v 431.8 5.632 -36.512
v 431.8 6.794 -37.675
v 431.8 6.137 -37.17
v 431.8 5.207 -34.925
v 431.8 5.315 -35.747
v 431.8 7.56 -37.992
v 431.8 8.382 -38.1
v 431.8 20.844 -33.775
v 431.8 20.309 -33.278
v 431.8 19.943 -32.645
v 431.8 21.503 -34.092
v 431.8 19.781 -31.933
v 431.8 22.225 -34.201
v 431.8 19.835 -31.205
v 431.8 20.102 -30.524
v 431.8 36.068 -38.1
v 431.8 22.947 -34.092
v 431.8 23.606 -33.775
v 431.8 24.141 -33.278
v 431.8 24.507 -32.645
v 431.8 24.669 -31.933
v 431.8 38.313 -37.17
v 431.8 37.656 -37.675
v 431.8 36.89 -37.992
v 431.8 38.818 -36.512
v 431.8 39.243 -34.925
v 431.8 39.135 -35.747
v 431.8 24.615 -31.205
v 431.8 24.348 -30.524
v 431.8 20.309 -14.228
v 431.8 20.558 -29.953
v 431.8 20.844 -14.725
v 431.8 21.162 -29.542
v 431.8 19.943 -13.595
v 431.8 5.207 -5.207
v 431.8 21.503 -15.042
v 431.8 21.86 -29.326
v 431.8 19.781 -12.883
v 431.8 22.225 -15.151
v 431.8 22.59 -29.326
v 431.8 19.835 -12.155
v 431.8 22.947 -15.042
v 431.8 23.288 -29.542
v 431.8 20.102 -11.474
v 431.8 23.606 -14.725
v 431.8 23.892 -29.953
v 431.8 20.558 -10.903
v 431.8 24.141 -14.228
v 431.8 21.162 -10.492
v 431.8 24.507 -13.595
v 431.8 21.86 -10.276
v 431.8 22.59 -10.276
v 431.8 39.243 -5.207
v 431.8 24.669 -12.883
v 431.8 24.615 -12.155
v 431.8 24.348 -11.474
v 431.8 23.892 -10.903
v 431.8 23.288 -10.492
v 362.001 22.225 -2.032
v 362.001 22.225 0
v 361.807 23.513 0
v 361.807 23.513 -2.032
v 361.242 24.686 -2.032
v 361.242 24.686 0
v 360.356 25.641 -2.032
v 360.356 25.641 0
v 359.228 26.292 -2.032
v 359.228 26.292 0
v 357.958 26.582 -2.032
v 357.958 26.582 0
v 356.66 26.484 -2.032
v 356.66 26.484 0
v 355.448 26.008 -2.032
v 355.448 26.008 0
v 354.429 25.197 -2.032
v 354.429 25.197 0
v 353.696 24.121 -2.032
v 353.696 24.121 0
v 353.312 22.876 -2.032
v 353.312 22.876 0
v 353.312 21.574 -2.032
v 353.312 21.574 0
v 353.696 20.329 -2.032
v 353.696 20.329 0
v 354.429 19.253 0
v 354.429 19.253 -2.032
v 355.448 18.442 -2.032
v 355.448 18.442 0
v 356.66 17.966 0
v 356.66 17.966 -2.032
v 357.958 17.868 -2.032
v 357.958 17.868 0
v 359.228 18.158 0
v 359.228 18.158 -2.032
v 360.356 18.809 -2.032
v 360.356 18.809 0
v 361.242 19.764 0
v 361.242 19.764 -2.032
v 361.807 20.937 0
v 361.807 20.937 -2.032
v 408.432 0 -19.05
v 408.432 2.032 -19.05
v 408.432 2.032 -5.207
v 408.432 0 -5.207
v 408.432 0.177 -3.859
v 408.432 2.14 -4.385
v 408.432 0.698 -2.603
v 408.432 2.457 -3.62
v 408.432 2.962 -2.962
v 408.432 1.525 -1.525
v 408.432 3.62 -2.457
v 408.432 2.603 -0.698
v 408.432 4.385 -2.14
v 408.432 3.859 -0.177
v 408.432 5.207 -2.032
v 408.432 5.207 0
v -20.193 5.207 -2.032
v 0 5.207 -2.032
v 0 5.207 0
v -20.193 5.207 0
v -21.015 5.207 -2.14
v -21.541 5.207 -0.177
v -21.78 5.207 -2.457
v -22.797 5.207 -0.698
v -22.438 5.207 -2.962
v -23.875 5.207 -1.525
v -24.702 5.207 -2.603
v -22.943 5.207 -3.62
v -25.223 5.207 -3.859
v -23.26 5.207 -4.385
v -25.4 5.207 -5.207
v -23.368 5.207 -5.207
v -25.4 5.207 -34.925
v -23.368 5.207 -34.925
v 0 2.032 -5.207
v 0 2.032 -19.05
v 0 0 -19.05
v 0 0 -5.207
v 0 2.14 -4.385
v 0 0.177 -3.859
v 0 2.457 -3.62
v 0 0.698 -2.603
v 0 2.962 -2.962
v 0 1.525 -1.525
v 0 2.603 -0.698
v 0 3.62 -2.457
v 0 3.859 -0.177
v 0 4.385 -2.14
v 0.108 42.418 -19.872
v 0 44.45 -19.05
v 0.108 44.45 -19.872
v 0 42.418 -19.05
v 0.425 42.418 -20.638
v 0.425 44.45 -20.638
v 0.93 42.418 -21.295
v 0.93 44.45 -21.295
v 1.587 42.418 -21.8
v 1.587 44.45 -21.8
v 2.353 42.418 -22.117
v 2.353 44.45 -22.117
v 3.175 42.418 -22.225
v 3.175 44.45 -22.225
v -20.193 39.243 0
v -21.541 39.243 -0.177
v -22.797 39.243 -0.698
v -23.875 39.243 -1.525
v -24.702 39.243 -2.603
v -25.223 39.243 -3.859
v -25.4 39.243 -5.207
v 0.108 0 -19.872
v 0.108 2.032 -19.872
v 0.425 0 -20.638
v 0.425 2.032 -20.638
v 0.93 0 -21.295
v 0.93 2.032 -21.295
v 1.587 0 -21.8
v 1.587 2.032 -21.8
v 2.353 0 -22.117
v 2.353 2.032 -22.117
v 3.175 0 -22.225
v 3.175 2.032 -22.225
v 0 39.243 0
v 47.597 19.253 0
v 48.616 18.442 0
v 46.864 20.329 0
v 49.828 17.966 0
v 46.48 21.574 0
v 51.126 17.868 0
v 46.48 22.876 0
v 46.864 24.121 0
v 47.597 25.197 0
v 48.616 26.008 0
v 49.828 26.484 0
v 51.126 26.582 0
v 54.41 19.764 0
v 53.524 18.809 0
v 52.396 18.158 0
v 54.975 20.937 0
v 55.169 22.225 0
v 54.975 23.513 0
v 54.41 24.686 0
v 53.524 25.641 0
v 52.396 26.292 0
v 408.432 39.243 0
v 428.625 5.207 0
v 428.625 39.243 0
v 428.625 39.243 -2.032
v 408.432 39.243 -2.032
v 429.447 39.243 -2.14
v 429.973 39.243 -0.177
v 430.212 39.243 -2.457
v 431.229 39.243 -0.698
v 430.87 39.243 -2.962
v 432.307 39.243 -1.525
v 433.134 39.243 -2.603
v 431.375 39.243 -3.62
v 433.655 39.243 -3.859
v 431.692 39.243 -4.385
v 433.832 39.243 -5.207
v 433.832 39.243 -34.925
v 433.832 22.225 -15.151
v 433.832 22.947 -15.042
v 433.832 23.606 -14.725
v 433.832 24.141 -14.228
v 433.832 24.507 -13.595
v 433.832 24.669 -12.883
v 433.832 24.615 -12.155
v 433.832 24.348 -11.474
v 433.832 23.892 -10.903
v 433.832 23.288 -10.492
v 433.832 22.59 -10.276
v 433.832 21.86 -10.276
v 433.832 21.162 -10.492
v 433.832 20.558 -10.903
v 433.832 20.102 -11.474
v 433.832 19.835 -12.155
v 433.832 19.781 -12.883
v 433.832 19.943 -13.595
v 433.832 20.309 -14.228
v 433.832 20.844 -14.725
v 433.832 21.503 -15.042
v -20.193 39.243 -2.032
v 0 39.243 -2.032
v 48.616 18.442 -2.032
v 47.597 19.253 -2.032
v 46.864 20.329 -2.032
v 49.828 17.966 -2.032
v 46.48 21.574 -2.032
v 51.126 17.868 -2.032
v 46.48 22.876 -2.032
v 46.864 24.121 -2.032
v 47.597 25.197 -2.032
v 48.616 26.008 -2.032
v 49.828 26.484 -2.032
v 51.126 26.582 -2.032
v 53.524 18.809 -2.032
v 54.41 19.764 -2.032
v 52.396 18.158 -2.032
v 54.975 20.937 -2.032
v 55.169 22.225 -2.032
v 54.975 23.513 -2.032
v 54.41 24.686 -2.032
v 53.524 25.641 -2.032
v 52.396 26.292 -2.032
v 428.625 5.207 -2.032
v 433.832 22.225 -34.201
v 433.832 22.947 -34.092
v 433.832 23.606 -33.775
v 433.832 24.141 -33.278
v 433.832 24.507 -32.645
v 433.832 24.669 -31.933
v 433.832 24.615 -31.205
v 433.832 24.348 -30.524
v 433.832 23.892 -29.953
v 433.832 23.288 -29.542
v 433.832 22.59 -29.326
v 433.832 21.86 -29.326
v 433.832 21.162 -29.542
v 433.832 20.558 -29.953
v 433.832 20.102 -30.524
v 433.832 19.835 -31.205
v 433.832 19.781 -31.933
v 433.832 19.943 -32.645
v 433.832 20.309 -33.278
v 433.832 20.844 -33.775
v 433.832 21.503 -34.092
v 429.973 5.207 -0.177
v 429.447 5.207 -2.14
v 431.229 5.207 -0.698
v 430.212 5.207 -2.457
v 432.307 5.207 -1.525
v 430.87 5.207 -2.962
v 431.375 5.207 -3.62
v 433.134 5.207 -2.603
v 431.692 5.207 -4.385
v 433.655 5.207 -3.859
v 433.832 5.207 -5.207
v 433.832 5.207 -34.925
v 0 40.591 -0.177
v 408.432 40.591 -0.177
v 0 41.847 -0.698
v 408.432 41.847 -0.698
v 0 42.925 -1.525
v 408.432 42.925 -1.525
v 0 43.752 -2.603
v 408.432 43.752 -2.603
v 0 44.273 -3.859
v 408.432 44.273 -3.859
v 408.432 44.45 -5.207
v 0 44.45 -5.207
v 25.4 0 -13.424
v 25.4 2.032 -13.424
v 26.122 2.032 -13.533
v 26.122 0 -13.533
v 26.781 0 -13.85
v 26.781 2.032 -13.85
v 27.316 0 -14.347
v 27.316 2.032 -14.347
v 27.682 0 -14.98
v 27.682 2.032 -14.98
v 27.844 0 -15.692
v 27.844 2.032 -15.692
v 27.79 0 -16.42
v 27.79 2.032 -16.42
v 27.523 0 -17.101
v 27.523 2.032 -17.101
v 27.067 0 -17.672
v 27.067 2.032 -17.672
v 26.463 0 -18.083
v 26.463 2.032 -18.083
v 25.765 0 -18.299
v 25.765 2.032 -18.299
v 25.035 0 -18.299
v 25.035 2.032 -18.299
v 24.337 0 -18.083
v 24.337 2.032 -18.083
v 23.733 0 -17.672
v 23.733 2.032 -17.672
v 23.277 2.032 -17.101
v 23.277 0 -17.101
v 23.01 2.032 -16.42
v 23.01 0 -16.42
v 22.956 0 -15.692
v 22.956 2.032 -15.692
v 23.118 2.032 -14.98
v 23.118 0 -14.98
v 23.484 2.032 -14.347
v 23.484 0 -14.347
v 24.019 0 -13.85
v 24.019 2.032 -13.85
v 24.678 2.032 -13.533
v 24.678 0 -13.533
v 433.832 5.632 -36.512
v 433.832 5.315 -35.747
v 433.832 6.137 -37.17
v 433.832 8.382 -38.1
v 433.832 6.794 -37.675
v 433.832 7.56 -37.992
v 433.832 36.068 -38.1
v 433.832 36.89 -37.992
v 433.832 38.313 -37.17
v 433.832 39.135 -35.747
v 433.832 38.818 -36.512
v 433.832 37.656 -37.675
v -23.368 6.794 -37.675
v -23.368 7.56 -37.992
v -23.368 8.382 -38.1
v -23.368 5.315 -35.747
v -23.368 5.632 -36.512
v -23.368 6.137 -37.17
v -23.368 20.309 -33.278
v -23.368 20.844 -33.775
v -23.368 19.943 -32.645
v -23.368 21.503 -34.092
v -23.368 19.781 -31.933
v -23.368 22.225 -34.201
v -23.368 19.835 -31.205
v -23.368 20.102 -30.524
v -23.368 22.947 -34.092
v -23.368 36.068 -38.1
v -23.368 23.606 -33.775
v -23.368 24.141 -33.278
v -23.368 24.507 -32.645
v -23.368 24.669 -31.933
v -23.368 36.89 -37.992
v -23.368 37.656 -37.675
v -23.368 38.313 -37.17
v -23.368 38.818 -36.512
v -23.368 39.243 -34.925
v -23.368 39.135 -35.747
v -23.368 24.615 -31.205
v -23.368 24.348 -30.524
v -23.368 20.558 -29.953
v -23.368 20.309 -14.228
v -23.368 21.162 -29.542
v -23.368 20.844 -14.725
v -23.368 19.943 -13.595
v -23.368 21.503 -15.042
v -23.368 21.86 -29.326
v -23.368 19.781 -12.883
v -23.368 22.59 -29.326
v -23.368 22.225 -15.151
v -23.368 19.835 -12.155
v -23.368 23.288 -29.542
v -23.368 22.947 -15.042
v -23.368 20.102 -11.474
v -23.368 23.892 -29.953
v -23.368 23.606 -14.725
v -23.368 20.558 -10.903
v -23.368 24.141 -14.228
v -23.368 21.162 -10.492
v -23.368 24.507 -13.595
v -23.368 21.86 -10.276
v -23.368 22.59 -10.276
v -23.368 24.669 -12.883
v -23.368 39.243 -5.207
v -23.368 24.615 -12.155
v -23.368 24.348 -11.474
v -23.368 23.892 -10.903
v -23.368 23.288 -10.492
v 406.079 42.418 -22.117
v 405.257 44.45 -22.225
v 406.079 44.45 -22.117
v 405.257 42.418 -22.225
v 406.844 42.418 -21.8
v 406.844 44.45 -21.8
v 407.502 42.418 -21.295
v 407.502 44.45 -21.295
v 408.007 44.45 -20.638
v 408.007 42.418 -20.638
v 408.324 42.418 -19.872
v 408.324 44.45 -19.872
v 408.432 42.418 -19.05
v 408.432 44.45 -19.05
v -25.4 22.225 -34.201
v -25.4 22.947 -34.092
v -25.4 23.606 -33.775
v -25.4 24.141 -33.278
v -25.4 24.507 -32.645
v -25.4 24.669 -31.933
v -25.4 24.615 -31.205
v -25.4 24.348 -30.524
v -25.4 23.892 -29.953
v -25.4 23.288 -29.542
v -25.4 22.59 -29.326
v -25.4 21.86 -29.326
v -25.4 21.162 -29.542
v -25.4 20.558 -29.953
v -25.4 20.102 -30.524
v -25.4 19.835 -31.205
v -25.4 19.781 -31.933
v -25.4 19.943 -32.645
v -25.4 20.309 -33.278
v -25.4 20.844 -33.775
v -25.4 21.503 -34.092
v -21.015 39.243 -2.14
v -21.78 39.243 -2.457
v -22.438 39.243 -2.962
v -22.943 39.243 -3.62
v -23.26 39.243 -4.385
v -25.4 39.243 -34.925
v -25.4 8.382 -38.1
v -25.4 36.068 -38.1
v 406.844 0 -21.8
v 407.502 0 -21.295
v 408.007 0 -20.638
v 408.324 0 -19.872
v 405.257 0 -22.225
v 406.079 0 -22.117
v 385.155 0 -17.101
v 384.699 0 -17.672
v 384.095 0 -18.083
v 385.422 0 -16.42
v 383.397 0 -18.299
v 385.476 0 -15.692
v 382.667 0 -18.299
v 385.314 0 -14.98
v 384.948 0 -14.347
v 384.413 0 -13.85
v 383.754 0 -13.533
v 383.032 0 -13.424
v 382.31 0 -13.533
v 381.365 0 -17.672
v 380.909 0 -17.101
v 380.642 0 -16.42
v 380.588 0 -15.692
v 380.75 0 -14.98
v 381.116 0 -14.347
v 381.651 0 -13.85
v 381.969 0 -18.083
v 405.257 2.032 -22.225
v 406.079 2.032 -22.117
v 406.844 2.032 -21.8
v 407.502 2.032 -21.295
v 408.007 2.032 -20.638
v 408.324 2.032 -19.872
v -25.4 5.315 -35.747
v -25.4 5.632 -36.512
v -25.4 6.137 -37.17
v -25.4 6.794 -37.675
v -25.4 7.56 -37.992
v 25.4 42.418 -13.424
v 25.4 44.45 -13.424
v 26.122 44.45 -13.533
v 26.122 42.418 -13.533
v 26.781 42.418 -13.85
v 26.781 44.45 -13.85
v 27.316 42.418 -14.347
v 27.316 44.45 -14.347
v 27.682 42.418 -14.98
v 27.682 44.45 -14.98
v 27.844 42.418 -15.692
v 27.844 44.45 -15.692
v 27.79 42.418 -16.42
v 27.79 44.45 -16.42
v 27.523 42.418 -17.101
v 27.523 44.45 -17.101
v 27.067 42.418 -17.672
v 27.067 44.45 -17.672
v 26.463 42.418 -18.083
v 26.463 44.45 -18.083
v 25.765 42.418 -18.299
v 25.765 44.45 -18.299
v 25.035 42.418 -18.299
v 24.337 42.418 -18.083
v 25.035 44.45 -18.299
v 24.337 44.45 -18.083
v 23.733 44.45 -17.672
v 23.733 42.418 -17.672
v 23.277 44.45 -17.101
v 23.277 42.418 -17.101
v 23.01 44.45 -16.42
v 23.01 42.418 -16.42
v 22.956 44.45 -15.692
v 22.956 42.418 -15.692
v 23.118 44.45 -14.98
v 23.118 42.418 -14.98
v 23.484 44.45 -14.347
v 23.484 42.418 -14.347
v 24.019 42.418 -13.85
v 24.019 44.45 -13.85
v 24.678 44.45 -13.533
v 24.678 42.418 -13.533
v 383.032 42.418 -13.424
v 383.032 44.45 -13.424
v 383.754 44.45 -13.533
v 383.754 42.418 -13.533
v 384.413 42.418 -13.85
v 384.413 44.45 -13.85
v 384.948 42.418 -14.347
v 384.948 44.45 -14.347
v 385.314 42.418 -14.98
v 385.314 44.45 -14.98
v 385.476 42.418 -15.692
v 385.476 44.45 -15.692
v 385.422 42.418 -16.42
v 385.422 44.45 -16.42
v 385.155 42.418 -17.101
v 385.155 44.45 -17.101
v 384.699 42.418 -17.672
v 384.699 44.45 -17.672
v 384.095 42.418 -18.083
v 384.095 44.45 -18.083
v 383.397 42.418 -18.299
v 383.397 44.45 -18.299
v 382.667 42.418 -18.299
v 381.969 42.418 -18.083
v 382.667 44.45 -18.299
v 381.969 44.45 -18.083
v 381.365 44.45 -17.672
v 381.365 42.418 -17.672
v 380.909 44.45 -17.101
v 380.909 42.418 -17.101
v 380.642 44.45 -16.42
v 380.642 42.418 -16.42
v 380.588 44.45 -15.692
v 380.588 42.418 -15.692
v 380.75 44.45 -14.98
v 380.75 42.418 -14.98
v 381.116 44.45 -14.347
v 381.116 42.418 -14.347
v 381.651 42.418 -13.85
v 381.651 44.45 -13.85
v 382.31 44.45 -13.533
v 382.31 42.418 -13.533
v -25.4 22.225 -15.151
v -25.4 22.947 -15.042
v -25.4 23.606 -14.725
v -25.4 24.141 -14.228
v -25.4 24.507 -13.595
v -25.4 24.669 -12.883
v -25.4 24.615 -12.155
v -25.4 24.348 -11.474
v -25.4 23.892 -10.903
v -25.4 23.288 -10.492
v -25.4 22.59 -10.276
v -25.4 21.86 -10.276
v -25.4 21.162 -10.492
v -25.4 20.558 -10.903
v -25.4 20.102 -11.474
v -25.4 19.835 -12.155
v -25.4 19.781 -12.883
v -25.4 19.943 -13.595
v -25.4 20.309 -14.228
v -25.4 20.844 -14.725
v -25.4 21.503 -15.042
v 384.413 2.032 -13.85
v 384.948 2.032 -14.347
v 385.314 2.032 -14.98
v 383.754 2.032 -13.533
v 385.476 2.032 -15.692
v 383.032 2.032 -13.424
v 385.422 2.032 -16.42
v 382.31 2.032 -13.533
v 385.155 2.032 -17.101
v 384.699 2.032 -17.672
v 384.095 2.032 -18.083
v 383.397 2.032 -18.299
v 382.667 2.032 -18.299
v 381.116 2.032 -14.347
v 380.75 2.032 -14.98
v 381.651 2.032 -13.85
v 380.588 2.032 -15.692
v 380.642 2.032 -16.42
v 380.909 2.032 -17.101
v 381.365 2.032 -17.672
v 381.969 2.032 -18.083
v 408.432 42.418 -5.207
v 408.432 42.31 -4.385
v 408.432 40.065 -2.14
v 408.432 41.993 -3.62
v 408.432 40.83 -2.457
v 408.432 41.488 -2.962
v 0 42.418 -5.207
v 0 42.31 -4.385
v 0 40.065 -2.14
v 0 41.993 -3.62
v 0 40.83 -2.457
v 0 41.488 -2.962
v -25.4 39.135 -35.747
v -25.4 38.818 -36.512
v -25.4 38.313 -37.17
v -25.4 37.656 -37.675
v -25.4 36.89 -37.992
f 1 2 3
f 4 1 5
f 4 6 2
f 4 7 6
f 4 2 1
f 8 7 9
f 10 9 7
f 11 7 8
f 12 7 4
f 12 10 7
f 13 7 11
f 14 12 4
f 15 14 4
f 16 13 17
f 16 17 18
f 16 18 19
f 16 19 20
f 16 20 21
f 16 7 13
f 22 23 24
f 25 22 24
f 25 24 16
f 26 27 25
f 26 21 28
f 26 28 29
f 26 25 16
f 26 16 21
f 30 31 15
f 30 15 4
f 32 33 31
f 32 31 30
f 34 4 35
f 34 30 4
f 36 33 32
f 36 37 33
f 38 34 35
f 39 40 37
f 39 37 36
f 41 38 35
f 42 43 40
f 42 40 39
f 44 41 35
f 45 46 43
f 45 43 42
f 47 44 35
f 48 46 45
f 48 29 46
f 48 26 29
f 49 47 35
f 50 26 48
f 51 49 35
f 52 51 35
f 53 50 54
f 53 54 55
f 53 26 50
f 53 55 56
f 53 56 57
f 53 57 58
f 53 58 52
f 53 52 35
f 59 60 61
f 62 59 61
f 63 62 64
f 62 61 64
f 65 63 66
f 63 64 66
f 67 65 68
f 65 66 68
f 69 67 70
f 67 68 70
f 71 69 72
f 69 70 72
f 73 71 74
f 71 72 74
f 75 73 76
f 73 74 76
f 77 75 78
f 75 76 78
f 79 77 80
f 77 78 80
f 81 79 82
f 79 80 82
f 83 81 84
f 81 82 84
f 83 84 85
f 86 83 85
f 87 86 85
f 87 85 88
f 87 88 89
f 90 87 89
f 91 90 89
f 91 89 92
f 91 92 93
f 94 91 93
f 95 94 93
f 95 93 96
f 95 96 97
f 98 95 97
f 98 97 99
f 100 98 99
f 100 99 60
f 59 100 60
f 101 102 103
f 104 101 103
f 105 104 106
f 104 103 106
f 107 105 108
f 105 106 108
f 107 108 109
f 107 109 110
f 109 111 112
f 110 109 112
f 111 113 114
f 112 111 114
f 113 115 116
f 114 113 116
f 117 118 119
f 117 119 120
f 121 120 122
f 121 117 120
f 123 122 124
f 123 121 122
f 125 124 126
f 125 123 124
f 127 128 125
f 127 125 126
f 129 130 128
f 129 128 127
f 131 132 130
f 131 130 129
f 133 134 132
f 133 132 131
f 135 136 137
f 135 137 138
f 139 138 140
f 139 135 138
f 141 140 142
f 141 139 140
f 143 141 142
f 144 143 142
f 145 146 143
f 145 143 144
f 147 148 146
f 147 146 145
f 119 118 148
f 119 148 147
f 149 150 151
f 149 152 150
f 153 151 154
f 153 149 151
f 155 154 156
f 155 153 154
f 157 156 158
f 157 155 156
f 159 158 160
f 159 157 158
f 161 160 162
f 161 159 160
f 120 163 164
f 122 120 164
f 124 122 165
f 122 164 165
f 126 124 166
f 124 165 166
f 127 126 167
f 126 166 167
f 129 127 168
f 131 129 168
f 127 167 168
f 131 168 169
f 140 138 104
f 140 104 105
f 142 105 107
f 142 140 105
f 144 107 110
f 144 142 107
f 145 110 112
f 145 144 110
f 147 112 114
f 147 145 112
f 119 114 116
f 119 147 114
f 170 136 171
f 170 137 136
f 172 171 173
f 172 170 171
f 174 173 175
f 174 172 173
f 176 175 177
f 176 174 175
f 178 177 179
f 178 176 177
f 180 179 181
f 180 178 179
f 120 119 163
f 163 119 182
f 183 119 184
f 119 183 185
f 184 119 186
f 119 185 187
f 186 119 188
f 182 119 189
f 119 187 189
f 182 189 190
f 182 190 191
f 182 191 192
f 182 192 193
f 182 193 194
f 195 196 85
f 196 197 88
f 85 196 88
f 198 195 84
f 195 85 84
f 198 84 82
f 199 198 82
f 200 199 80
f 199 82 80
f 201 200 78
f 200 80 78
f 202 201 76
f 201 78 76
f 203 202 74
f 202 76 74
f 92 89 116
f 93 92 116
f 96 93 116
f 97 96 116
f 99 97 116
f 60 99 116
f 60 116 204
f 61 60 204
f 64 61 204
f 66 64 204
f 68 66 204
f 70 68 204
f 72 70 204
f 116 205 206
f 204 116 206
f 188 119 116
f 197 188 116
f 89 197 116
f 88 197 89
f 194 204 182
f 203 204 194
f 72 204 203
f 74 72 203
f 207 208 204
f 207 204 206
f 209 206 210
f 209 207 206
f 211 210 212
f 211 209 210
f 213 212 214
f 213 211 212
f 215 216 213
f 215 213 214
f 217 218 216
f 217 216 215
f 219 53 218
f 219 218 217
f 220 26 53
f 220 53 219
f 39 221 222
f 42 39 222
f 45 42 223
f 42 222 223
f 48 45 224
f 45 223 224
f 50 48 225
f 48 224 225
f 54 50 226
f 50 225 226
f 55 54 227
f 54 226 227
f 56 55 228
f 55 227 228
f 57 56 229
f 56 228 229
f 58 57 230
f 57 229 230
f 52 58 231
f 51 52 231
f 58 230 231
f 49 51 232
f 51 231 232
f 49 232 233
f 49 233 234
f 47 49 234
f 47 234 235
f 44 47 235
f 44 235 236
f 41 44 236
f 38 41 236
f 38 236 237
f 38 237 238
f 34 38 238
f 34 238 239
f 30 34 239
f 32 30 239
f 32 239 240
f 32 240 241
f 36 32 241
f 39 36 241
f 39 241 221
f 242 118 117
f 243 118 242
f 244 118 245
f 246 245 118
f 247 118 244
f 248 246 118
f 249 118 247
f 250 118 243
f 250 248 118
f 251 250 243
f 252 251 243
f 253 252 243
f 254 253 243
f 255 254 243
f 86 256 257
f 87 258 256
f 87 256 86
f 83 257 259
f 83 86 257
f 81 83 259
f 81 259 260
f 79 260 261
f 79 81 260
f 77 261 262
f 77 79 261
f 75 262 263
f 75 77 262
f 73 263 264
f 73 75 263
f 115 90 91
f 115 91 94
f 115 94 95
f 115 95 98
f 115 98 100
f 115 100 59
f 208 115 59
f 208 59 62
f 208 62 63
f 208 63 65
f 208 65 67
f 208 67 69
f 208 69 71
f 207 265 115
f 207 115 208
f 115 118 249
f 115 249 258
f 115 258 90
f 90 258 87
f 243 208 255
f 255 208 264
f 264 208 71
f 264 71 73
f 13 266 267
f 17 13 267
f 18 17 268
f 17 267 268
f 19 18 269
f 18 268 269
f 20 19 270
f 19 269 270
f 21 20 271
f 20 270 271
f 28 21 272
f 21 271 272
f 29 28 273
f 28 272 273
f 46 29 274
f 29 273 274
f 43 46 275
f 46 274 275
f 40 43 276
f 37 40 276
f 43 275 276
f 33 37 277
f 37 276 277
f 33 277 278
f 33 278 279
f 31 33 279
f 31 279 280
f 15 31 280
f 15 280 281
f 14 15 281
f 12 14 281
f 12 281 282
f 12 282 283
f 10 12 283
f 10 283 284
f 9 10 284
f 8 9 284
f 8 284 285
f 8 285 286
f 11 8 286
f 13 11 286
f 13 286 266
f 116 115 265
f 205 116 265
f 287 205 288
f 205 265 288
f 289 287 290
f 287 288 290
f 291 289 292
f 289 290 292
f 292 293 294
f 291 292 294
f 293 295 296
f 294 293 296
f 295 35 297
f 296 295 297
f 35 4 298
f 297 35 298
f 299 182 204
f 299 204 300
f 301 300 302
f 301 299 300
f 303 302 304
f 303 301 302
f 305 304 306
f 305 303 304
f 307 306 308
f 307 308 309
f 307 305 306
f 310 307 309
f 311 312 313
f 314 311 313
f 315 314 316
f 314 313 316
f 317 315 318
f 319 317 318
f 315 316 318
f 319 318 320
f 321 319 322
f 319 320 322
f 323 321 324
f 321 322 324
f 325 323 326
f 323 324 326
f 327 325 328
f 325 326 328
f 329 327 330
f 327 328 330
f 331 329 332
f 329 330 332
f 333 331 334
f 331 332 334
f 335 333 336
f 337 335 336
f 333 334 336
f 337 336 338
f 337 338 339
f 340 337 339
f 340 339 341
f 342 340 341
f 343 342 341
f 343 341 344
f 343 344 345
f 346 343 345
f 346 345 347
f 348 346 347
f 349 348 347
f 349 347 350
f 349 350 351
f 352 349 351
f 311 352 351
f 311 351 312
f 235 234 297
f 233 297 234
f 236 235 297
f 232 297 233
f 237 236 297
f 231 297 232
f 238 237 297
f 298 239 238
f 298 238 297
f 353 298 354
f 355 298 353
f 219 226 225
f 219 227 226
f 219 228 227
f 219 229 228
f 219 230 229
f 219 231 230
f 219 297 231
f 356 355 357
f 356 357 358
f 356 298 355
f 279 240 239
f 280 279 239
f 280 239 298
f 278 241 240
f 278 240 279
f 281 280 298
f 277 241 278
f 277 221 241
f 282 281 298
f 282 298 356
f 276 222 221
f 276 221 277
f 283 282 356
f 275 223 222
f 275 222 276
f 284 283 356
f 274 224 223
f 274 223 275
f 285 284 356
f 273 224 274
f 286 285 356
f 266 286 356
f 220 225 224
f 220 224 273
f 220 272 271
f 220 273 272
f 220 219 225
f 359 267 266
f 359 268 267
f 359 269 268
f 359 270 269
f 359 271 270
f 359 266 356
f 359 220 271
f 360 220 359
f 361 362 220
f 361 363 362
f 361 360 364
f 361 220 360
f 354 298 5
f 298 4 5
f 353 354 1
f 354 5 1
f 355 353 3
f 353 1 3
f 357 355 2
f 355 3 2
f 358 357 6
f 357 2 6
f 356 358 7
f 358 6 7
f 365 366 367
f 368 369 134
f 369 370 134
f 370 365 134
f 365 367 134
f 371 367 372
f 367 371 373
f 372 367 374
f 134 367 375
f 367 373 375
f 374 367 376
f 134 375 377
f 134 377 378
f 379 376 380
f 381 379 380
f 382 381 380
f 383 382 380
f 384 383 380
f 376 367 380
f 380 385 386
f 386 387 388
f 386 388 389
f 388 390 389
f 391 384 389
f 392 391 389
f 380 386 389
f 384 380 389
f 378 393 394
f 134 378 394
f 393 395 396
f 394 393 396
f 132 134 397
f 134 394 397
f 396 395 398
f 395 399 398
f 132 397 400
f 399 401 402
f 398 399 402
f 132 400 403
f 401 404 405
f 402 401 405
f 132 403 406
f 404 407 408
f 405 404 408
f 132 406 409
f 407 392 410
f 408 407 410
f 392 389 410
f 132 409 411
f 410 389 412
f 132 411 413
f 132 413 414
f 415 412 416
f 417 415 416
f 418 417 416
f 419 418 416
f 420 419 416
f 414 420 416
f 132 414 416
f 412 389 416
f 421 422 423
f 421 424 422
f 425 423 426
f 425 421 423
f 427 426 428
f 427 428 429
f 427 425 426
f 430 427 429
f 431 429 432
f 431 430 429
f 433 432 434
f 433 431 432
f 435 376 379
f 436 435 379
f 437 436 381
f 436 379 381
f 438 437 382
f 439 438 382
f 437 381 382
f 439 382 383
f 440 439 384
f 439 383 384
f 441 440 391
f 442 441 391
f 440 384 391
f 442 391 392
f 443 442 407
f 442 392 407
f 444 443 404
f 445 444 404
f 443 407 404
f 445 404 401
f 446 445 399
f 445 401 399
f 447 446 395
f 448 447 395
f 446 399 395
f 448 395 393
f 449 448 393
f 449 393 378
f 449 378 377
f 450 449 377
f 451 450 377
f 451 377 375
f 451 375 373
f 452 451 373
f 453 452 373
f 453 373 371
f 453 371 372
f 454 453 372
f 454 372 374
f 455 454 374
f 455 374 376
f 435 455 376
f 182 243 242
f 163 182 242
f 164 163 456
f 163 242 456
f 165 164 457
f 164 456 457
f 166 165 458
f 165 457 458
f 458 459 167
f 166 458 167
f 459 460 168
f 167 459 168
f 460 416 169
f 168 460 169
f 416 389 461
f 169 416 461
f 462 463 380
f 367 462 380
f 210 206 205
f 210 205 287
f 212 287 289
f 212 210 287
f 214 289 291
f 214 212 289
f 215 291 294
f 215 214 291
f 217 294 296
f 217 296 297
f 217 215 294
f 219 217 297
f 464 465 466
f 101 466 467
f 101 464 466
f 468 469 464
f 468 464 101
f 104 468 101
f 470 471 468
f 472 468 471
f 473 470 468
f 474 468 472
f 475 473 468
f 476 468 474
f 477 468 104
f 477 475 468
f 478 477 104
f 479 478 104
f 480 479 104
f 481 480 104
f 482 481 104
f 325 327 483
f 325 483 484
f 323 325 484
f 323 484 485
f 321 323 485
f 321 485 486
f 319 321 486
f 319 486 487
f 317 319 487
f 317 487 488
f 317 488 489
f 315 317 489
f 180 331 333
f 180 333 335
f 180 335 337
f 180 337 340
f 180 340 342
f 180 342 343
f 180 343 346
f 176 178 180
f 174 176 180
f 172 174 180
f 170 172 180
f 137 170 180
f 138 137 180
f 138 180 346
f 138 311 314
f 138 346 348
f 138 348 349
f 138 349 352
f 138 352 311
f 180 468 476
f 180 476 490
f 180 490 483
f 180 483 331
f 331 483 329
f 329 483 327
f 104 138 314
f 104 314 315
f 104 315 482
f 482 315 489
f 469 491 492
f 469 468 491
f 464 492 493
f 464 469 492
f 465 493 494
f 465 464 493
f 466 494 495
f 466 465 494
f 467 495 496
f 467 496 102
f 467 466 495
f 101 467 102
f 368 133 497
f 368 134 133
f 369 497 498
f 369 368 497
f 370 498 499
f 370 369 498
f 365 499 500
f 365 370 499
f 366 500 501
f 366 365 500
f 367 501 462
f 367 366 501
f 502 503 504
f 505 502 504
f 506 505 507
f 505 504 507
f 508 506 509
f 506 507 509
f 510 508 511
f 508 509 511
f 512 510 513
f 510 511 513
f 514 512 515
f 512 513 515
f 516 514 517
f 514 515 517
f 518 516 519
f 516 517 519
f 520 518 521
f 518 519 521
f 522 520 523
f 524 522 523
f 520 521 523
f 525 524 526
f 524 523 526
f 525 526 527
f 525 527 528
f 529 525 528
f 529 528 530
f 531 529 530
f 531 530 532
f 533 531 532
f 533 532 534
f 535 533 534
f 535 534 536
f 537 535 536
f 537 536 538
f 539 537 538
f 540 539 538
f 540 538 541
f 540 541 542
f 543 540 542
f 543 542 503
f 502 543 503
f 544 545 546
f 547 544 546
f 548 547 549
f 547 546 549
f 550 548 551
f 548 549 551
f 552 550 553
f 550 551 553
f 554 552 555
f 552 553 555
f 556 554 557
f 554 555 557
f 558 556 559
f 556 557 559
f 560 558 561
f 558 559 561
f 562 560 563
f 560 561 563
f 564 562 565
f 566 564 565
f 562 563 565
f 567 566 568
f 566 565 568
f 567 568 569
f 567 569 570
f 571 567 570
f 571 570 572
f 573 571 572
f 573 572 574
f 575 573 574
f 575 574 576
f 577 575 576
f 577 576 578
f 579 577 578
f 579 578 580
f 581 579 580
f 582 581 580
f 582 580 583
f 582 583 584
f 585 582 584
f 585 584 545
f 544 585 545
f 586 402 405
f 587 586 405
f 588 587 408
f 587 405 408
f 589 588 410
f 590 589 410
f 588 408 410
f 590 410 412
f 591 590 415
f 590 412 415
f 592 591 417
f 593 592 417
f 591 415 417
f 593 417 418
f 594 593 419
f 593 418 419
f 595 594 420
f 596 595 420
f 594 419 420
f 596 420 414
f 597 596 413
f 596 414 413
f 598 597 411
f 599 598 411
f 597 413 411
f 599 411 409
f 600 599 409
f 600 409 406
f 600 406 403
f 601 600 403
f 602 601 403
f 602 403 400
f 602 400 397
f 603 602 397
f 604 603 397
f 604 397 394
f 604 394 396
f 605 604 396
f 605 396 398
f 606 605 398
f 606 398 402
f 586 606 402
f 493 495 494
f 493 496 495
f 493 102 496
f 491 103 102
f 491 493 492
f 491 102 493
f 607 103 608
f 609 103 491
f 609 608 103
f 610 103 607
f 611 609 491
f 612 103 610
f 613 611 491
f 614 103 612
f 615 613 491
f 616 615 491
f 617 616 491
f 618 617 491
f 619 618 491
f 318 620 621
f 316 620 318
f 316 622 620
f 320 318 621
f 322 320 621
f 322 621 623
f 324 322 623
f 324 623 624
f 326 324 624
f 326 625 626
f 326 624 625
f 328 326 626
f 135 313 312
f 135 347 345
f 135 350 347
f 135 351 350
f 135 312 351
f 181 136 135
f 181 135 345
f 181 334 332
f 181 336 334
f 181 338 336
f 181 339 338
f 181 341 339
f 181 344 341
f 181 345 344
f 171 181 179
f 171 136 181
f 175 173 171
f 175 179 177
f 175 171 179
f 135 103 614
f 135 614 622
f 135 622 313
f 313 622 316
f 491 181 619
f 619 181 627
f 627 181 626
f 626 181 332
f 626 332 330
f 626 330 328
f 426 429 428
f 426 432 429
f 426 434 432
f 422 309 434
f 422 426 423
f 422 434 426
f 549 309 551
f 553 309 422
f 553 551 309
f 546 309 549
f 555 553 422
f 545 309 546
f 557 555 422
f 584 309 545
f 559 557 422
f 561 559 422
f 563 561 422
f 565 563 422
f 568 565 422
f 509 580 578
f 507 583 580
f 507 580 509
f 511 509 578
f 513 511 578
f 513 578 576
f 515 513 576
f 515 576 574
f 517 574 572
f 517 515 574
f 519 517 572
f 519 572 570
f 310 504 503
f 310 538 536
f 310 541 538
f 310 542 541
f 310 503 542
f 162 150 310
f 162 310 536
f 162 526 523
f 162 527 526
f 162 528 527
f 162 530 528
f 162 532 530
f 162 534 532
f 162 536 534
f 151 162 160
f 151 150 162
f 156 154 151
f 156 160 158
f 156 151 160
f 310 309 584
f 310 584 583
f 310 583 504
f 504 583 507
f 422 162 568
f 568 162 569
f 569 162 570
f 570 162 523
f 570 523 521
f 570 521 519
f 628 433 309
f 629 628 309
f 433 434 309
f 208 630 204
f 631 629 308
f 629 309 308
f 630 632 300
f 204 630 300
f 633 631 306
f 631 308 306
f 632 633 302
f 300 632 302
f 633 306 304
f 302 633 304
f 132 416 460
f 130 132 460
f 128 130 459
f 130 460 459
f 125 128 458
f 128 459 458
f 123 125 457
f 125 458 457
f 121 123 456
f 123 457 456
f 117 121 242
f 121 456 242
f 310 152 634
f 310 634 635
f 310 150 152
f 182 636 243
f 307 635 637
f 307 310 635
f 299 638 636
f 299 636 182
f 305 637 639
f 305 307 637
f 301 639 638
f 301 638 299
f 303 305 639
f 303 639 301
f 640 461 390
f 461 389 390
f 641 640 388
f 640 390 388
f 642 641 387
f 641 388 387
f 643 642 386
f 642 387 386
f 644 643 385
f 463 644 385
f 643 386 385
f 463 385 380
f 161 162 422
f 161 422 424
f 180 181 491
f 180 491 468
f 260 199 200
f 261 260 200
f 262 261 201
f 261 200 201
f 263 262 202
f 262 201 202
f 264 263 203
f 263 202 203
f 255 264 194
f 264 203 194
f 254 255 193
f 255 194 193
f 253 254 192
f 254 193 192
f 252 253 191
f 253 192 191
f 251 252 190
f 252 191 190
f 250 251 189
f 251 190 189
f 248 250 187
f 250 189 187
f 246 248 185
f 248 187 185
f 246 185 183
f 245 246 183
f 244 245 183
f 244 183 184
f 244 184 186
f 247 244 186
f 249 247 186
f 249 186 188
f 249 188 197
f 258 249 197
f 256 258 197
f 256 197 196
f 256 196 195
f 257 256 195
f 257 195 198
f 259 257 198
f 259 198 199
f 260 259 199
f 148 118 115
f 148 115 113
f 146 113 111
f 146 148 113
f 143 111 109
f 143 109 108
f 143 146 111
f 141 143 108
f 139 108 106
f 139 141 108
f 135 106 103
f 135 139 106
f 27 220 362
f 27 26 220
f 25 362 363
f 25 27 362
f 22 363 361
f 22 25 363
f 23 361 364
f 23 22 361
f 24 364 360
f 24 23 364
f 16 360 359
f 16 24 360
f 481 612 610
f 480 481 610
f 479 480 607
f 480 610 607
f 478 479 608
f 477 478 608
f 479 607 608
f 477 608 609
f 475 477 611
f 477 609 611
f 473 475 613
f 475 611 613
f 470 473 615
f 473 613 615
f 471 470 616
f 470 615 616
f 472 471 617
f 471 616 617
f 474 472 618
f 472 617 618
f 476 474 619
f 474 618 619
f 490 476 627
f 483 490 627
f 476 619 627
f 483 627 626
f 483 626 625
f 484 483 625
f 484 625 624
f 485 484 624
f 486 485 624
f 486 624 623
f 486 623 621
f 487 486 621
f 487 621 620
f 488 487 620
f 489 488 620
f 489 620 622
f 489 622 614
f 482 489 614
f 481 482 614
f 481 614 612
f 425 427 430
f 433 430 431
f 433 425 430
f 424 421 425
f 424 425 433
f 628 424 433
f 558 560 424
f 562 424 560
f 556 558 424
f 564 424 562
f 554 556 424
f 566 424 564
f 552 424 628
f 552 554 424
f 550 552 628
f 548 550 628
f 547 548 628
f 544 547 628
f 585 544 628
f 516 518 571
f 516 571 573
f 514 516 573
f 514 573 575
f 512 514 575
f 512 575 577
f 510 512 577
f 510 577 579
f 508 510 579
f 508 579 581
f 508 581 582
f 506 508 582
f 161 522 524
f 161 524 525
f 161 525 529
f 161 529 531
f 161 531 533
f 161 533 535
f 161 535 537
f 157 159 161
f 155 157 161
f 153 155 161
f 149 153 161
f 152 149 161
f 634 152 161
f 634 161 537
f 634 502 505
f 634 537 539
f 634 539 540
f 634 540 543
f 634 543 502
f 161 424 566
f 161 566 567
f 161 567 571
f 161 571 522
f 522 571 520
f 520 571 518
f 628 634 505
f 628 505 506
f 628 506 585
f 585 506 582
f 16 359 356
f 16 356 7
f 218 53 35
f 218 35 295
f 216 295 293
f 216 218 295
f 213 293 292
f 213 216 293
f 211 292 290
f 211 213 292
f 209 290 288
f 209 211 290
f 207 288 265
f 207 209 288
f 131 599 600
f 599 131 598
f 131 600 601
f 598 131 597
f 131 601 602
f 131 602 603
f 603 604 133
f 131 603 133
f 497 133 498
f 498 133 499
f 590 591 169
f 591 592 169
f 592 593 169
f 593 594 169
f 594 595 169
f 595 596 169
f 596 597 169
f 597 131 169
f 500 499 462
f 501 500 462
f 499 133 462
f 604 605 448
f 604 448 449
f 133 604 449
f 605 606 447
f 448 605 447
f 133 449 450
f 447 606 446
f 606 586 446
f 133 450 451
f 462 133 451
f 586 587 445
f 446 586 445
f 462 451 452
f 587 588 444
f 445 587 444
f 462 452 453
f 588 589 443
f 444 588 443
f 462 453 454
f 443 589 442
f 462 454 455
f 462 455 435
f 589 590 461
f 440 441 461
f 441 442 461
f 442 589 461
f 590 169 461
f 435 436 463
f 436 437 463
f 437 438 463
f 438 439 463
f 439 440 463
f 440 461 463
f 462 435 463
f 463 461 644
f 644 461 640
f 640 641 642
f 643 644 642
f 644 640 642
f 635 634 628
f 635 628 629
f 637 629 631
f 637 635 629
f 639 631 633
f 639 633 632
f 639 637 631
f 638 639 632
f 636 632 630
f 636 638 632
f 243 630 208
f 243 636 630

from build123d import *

# Parameters (mm, degrees)
BASE_FLANGE1_DEPTH           = 408.432
SKETCH2_W                    = 2.032
SKETCH2_H                    = 34.036
BOSS_EXTRUDE1_DEPTH          = 25.4
EDGE_FLANGE1_STRIP_W         = 14.478
EDGE_FLANGE1_STRIP_H         = 2.032
EDGE_FLANGE1_STRIP_CUT_DEPTH = 34.036
EDGE_FLANGE1_DEPTH           = 34.036
SKETCH6_R                    = 2.4511
CUT_EXTRUDE1_DEPTH           = 438.764339256
SKETCH7_R                    = 4.3688
CUT_EXTRUDE2_DEPTH           = 438.764339256
SKETCH8_R                    = 2.4511
CUT_EXTRUDE3_DEPTH           = 463.94863897
FILLET1_R                    = 3.175


# Sheet-metal steps are written as plain solids
with BuildPart() as part:
    # Sketch1 → Base-Flange1 (new body)
    with BuildSketch(Plane(origin=(0, 0, 0), x_dir=(0, 0, -1), z_dir=(1, 0, 0))):
        with BuildLine():
            Line((22.225, 0), (5.207, 0))
            ThreePointArc((5.207, 0), (1.52509499, 1.52509499), (0, 5.207))
            Line((0, 5.207), (0, 39.243))
            ThreePointArc((0, 39.243), (1.52509499, 42.92490501), (5.207, 44.45))
            Line((5.207, 44.45), (22.225, 44.45))
            Line((22.225, 44.45), (22.225, 42.418))
            Line((22.225, 42.418), (5.207, 42.418))
            ThreePointArc((5.207, 42.418), (2.96193597, 41.48806403), (2.032, 39.243))
            Line((2.032, 39.243), (2.032, 5.207))
            ThreePointArc((2.032, 5.207), (2.96193597, 2.96193597), (5.207, 2.032))
            Line((5.207, 2.032), (22.225, 2.032))
            Line((22.225, 2.032), (22.225, 0))
        make_face()
    extrude(amount=BASE_FLANGE1_DEPTH)

    # Sketch2 → Boss-Extrude1 (add)
    with BuildSketch(Plane(origin=(408.432, 0, 0), x_dir=(0, 0, -1), z_dir=(1, 0, 0))):
        with Locations((1.016, 22.225)):
            Rectangle(SKETCH2_W, SKETCH2_H)
    boss_extrude1 = extrude(amount=BOSS_EXTRUDE1_DEPTH)

    # Edge-Flange1 strip (across the edge) → Edge-Flange1 strip cut (cut)
    with BuildSketch(Plane(origin=(433.832, 39.243, -2.032), x_dir=(-1, 0, 0), z_dir=(0, -1, 0))):
        with Locations((-2.032, -1.016)):
            Rectangle(EDGE_FLANGE1_STRIP_W, EDGE_FLANGE1_STRIP_H)
    edge_flange1_strip_cut = extrude(amount=EDGE_FLANGE1_STRIP_CUT_DEPTH, mode=Mode.SUBTRACT)

    # Edge-Flange1 section (across the edge) → Edge-Flange1 (add)
    with BuildSketch(Plane(origin=(433.832, 39.243, -2.032), x_dir=(-1, 0, 0), z_dir=(0, -1, 0))):
        with BuildLine():
            Line((0, 3.175), (0, 36.068))
            Line((0, 36.068), (2.032, 36.068))
            Line((2.032, 36.068), (2.032, 3.175))
            ThreePointArc((2.032, 3.175), (2.96193597, 0.92993597), (5.207, 0))
            Line((5.207, 0), (5.207, -2.032))
            ThreePointArc((5.207, -2.032), (1.52509499, -0.50690501), (0, 3.175))
        make_face()
    edge_flange1 = extrude(amount=EDGE_FLANGE1_DEPTH)

    # Mirror1: Boss-Extrude1, Edge-Flange1 strip cut, Edge-Flange1 across plane
    add(boss_extrude1.mirror(Plane.ZY.offset(-204.216)))
    add(edge_flange1_strip_cut.mirror(Plane.ZY.offset(-204.216)), mode=Mode.SUBTRACT)
    add(edge_flange1.mirror(Plane.ZY.offset(-204.216)))

    # Sketch6 → Cut-Extrude1 (cut, through all)
    with BuildSketch(Plane(origin=(0, 44.45, 0), x_dir=(1, 0, 0), z_dir=(0, 1, 0))):
        with Locations(Location((25.4, 15.875, 0), (0, 0, 270))):
            Circle(SKETCH6_R)
        with Locations(Location((383.032, 15.875, 0), (0, 0, 270))):
            Circle(SKETCH6_R)
    extrude(amount=-CUT_EXTRUDE1_DEPTH, mode=Mode.SUBTRACT)

    # Sketch7 → Cut-Extrude2 (cut, through all)
    with BuildSketch(Plane.XY):
        with Locations((50.8, 22.225)):
            Circle(SKETCH7_R)
        with Locations((357.632, 22.225)):
            Circle(SKETCH7_R)
    extrude(amount=-CUT_EXTRUDE2_DEPTH, mode=Mode.SUBTRACT)

    # Sketch8 → Cut-Extrude3 (cut, through all)
    with BuildSketch(Plane(origin=(433.832, 0, 0), x_dir=(0, 0, -1), z_dir=(1, 0, 0))):
        with Locations((31.75, 22.225)):
            Circle(SKETCH8_R)
        with Locations((12.7, 22.225)):
            Circle(SKETCH8_R)
    extrude(amount=-CUT_EXTRUDE3_DEPTH, mode=Mode.SUBTRACT)

    # Fillet1
    fillet1_edges = [part.edges().sort_by_distance(p)[0] for p in [
        (-24.384, 5.207, -38.1),
        (0, 1.016, -22.225),
        (-24.384, 39.243, -38.1),
        (0, 43.434, -22.225),
        (408.432, 1.016, -22.225),
        (432.816, 39.243, -38.1),
        (432.816, 5.207, -38.1),
        (408.432, 43.434, -22.225),
    ]]
    fillet(fillet1_edges, radius=FILLET1_R)


solid = part.part
